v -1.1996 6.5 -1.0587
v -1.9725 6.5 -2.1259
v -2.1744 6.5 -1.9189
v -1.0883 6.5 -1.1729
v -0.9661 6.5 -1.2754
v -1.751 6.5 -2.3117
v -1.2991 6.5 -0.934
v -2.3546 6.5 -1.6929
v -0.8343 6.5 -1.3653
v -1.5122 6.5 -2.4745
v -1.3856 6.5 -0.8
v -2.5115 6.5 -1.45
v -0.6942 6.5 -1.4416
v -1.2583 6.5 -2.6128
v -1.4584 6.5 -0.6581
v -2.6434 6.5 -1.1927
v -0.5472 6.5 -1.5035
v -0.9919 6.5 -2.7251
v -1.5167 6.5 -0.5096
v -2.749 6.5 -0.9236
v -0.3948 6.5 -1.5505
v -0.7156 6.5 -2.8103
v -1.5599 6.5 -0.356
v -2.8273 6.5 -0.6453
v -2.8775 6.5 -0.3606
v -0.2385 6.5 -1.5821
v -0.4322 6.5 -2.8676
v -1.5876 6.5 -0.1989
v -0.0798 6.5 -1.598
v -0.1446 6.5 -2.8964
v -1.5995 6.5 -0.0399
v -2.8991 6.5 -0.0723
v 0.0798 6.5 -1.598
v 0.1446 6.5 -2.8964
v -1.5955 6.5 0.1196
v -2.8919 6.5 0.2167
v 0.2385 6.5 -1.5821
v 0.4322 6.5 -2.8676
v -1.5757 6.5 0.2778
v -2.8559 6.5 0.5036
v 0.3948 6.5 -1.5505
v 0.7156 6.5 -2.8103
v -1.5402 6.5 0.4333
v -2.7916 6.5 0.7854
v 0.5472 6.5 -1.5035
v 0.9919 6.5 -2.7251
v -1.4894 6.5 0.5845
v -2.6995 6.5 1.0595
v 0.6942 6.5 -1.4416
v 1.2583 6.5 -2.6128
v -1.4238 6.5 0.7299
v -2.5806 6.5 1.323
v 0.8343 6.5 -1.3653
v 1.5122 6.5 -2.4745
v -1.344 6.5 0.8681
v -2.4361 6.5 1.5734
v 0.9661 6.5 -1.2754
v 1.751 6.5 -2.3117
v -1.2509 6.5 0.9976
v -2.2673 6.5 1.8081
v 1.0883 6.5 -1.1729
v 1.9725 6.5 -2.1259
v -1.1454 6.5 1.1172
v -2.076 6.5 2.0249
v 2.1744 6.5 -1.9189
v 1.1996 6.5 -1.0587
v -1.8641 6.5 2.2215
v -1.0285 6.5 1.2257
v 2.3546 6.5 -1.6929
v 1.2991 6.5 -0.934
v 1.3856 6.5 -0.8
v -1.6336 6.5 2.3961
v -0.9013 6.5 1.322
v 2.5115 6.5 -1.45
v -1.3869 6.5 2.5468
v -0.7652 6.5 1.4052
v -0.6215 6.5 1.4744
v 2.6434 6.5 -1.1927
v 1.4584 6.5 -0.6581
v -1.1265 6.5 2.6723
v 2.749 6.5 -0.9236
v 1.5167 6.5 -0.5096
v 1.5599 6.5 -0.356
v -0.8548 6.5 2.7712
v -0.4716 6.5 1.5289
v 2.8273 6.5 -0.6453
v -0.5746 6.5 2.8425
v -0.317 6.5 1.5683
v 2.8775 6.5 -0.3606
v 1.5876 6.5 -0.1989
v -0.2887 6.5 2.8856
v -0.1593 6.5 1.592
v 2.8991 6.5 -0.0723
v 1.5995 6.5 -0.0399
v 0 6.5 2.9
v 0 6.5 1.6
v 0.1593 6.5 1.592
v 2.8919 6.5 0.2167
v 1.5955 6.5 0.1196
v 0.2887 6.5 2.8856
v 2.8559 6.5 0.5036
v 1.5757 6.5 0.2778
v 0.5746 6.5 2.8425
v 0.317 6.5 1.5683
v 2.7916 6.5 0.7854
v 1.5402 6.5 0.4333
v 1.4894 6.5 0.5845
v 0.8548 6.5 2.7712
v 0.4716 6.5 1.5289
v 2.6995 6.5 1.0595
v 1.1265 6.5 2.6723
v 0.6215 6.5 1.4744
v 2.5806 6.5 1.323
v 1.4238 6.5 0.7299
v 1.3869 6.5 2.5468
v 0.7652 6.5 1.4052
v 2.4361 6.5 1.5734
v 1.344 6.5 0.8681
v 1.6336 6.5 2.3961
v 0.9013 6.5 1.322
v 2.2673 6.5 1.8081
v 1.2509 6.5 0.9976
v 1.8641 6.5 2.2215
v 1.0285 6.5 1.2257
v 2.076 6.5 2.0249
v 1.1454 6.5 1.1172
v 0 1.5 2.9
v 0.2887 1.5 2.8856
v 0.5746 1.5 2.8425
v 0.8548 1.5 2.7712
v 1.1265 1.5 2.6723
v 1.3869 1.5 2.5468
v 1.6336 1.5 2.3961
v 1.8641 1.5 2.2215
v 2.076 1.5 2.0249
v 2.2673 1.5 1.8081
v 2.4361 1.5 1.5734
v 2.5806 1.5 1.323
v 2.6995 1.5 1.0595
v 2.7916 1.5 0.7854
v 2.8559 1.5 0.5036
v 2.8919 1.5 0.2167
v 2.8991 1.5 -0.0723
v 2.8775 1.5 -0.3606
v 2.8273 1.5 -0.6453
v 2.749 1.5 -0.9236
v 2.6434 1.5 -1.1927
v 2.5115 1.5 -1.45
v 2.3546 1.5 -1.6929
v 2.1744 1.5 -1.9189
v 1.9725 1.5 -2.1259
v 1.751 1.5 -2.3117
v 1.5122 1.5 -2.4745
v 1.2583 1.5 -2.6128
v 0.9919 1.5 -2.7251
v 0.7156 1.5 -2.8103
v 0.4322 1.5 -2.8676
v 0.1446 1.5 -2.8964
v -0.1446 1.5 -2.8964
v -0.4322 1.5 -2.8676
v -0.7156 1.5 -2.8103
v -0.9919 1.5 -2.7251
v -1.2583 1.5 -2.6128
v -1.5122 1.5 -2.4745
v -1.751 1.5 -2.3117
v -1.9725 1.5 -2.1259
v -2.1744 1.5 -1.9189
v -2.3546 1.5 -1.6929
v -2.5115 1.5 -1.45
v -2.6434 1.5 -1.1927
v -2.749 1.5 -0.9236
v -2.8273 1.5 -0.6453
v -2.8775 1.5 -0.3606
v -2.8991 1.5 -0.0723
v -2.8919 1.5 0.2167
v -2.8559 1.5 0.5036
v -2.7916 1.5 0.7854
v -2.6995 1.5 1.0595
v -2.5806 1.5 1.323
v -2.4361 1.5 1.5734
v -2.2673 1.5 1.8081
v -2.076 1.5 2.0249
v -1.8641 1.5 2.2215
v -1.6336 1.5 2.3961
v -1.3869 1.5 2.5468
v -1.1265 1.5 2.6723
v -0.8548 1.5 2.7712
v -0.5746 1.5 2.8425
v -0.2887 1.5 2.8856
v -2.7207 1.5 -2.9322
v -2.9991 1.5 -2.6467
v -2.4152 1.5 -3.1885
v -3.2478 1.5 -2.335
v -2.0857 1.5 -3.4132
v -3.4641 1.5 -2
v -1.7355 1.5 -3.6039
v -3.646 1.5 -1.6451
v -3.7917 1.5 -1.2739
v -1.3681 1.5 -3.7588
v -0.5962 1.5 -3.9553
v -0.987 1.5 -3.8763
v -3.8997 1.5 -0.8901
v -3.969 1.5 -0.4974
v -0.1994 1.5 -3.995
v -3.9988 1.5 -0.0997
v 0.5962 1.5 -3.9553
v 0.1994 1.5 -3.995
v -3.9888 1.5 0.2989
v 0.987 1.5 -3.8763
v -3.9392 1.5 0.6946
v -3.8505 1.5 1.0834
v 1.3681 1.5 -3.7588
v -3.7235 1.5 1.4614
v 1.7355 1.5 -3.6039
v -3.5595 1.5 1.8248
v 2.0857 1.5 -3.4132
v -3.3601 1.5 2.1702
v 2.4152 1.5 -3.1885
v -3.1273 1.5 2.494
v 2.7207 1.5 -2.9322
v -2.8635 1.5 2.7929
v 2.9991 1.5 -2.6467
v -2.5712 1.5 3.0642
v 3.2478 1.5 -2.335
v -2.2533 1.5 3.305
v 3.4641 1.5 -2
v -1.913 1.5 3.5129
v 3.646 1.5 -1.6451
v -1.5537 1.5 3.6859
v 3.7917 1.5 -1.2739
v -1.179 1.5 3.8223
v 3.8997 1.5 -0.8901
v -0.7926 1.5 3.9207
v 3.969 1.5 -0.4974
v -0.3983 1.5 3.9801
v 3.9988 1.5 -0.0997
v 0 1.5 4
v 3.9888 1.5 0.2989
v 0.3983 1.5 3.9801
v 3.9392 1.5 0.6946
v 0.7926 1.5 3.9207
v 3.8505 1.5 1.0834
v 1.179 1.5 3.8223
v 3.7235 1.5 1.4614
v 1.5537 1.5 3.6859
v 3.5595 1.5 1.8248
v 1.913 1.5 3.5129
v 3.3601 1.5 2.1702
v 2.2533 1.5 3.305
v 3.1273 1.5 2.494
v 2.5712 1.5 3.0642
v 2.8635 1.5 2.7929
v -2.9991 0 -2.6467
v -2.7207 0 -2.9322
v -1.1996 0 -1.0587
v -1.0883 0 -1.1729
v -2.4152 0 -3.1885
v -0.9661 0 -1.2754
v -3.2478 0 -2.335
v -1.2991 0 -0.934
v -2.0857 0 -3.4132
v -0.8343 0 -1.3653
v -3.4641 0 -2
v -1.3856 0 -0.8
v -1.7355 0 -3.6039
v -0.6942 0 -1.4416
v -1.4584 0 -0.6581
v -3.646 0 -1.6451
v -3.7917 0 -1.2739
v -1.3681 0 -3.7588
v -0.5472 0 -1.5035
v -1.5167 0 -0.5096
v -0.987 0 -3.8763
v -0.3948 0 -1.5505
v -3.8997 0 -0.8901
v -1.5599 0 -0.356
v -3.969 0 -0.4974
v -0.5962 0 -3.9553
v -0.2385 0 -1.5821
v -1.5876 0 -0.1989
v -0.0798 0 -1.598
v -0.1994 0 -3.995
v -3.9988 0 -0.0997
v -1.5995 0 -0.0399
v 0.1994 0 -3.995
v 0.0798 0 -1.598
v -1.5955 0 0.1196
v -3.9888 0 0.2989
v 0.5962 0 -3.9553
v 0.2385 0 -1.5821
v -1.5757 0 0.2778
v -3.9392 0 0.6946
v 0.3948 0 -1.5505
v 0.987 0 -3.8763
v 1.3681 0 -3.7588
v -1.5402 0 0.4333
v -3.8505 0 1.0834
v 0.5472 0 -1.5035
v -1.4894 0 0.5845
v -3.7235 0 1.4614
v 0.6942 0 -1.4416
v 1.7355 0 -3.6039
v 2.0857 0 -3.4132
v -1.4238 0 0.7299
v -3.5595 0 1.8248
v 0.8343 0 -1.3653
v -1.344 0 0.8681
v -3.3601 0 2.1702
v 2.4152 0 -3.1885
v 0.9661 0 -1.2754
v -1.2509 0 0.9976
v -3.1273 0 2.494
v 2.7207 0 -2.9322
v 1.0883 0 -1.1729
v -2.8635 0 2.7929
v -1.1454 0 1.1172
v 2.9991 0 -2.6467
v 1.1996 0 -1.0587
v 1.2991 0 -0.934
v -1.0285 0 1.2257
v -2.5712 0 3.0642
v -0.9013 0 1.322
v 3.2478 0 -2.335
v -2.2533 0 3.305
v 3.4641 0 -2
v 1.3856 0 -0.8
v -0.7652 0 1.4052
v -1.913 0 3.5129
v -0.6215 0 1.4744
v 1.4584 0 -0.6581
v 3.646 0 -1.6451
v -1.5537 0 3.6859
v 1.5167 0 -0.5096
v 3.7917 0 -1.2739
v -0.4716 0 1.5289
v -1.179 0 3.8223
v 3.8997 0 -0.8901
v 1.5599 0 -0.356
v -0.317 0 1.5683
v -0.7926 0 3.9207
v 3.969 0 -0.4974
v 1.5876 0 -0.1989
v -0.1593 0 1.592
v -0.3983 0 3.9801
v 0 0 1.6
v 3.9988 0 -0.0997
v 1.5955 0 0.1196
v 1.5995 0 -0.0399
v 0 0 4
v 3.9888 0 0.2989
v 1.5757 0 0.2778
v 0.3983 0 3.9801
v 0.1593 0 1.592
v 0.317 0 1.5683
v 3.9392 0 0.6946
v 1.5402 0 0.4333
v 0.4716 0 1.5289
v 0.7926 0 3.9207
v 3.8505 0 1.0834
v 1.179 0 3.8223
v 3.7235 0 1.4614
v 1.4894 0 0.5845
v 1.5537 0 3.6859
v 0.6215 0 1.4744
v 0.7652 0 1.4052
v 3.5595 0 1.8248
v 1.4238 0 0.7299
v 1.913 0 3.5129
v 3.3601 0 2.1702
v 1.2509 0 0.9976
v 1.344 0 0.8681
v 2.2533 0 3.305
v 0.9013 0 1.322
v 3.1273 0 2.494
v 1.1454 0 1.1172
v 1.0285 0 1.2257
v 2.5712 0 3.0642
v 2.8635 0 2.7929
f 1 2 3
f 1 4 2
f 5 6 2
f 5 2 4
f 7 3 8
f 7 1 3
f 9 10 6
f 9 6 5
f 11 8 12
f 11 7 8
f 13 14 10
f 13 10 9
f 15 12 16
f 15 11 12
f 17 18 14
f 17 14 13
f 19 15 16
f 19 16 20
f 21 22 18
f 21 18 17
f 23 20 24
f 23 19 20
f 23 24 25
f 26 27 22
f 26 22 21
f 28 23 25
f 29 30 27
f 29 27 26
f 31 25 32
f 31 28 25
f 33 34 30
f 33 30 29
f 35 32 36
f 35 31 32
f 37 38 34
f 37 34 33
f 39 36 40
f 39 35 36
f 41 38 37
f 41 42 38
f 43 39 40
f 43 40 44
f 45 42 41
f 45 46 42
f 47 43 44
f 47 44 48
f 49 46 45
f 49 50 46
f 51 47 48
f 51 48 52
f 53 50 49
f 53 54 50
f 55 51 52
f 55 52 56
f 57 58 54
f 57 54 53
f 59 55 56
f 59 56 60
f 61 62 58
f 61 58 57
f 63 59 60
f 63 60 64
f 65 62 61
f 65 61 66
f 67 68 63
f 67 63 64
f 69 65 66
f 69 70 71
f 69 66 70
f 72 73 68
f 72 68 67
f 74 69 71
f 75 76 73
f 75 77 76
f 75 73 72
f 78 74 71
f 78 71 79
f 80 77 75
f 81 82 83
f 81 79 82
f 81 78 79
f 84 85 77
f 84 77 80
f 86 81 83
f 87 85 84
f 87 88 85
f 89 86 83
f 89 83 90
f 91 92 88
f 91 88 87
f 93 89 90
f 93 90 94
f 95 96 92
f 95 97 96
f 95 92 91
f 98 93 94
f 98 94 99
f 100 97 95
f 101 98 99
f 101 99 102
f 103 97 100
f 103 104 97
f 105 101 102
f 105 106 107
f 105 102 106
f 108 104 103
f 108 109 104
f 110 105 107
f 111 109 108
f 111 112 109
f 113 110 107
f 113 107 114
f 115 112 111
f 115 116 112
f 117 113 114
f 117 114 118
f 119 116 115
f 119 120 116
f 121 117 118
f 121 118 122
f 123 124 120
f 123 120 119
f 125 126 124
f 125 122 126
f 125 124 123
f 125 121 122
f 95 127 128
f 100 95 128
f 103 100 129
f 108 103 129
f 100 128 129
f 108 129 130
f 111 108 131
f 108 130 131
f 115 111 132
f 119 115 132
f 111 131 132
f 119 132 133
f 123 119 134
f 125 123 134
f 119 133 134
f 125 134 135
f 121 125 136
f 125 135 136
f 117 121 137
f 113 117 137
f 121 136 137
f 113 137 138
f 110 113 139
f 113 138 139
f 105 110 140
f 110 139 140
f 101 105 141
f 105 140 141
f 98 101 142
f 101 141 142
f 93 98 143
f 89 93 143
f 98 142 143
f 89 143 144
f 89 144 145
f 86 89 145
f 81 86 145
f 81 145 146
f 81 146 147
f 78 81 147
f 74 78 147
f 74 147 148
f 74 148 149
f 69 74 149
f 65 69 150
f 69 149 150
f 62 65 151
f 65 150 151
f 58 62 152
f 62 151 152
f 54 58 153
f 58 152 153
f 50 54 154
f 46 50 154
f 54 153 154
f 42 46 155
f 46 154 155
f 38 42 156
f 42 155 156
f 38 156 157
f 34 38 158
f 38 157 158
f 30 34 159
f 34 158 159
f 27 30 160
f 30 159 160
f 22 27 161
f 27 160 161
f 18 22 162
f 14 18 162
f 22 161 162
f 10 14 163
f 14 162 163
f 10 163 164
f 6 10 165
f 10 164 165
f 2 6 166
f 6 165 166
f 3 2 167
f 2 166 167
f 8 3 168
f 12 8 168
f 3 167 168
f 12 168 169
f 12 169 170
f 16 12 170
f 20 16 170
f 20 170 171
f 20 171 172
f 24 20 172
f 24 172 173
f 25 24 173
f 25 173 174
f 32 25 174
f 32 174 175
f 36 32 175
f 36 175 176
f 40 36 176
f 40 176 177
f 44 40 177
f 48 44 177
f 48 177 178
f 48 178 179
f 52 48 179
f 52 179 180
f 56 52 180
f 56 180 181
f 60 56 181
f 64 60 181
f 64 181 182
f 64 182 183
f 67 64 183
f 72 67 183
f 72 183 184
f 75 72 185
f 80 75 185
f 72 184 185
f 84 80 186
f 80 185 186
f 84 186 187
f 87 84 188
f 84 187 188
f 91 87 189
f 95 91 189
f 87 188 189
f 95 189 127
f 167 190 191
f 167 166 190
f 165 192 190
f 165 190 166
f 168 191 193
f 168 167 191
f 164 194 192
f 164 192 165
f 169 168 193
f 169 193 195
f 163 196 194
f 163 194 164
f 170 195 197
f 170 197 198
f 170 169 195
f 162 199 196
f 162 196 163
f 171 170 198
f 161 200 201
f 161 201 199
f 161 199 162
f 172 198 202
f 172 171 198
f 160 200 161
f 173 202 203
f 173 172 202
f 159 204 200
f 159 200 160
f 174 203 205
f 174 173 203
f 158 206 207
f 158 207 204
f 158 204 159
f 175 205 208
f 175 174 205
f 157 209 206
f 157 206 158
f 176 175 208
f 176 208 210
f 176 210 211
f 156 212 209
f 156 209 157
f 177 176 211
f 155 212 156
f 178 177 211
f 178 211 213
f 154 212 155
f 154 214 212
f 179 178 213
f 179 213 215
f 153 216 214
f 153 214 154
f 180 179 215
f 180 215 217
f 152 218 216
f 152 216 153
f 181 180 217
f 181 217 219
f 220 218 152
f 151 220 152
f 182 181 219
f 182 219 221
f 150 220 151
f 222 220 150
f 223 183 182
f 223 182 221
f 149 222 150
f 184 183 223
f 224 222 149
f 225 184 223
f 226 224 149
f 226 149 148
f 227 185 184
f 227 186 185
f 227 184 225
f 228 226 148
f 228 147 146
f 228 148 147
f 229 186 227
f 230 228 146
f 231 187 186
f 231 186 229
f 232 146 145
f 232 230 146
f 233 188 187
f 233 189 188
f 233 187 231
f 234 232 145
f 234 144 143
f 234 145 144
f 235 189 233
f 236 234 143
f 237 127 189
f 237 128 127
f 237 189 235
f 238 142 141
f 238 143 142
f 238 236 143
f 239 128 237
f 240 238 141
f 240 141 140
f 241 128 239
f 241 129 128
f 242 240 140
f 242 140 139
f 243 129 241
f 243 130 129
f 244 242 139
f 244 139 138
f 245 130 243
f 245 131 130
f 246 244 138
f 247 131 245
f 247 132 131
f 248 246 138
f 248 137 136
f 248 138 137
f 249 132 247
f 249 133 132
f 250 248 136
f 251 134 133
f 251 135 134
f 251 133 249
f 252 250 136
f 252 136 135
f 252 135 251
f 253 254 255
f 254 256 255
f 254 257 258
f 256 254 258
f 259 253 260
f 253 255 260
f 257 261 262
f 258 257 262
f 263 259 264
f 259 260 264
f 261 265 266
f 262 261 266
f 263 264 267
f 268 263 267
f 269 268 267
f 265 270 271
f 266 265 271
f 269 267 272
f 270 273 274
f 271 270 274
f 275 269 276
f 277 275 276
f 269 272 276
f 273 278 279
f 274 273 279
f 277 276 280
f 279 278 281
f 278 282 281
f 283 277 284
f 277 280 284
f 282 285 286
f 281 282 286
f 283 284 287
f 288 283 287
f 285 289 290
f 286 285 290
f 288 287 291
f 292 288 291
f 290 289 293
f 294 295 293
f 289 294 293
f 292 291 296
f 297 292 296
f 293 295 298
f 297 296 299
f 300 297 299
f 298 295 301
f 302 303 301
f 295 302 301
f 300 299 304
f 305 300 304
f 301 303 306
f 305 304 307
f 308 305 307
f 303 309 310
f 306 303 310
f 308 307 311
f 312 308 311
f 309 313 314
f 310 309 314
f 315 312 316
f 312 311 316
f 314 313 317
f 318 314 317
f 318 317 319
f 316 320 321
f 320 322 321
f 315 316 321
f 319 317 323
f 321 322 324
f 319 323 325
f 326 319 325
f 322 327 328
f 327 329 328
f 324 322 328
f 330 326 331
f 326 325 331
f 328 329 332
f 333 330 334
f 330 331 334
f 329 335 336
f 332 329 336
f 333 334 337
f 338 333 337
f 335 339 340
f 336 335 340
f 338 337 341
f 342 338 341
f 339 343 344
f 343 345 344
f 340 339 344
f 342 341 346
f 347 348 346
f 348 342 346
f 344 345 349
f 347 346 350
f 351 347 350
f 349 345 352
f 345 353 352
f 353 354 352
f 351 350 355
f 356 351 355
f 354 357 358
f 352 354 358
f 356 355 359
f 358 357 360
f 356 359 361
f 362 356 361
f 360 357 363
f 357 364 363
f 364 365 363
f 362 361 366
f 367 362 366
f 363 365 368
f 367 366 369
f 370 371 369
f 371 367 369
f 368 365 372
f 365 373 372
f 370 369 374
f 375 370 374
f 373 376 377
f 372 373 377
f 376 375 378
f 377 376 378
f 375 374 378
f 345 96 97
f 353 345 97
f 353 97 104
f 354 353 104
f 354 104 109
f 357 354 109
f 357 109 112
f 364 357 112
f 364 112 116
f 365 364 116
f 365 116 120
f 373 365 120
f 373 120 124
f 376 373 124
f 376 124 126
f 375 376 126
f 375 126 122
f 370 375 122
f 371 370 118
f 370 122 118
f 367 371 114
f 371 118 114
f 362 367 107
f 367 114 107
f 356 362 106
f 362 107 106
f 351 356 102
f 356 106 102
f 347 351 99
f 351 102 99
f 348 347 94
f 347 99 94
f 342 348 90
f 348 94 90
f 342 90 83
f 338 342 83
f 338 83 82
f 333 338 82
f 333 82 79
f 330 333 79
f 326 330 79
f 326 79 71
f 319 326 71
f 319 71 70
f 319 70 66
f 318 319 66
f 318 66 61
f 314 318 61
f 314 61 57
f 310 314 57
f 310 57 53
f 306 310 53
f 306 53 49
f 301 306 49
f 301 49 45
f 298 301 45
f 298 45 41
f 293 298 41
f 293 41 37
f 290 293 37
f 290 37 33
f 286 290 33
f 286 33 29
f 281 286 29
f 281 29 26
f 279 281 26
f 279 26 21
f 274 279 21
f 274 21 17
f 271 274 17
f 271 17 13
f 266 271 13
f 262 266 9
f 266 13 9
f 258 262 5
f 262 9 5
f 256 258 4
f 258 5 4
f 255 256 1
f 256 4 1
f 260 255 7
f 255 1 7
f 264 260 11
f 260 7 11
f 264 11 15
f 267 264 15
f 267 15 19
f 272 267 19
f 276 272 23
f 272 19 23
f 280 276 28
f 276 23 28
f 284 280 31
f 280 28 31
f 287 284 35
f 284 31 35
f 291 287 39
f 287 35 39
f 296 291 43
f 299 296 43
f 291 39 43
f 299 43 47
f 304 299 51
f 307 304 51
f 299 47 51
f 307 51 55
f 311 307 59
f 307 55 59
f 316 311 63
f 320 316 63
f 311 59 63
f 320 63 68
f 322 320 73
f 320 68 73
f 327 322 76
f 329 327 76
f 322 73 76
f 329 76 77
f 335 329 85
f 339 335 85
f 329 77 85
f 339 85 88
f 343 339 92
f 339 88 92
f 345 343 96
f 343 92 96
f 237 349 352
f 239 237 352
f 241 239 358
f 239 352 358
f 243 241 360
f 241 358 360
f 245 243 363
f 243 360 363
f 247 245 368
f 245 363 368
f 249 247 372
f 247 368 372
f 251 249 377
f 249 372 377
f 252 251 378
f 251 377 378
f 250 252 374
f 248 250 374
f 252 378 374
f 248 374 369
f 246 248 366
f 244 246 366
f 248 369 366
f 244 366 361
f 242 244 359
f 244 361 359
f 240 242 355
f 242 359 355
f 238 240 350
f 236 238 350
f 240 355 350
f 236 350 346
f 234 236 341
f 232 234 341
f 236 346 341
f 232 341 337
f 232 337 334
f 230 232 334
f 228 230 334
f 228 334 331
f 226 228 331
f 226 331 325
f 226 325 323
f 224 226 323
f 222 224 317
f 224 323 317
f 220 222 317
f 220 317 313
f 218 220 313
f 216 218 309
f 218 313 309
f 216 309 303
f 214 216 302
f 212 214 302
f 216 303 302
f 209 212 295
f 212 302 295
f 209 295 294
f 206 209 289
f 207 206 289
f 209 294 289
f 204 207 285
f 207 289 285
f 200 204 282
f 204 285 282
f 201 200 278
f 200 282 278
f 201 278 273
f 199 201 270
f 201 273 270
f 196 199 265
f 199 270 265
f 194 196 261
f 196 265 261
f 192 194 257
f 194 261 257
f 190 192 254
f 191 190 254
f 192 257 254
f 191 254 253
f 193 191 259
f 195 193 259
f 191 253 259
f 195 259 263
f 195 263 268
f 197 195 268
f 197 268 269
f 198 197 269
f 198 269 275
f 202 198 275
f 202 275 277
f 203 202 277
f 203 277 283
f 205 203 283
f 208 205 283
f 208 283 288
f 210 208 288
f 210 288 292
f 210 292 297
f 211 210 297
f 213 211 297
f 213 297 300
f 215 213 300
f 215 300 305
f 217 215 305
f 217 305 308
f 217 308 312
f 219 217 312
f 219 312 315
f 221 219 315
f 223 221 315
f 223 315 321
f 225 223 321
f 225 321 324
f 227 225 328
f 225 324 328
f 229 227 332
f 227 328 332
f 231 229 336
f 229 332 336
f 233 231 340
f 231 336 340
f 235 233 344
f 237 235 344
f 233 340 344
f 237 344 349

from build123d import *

# Parameters (mm, degrees)
SKETCH_1_R          = 4
EXTRUDE_1_DEPTH     = 1.5
SKETCH_2_R          = 2.9
EXTRUDE_2_DEPTH     = 5
CUT_EXTRUDE_1_REACH = 10.617
SKETCH_3_R          = 1.6


with BuildPart() as part:
    # 草图1 → 凸台-拉伸1 (new body)
    with BuildSketch(Plane(origin=(0, 0, 0), x_dir=(1, 0, 0), z_dir=(0, 1, 0))):
        with Locations(Location((0, 0, 0), (0, 0, 270))):
            Circle(SKETCH_1_R)
    extrude(amount=EXTRUDE_1_DEPTH)

    # 草图2 → 凸台-拉伸2 (add)
    with BuildSketch(Plane(origin=(0, 1.5, 0), x_dir=(1, 0, 0), z_dir=(0, 1, 0))):
        with Locations(Location((0, 0, 0), (0, 0, 270))):
            Circle(SKETCH_2_R)
    extrude(amount=EXTRUDE_2_DEPTH)

    # 草图3 → 切除-拉伸1 (cut, up to next)
    with BuildSketch(Plane(origin=(0, 6.5, 0), x_dir=(1, 0, 0), z_dir=(0, 1, 0)), mode=Mode.PRIVATE) as cut_extrude_1_sk1:
        with Locations(Location((0, 0, 0), (0, 0, 270))):
            Circle(SKETCH_3_R)
    cut_extrude_1_tool1 = extrude(cut_extrude_1_sk1.sketch, amount=-CUT_EXTRUDE_1_REACH, mode=Mode.PRIVATE) & part.part
    add(cut_extrude_1_tool1.solids().sort_by_distance((0, 6.5, 0))[0], mode=Mode.SUBTRACT)


solid = part.part
